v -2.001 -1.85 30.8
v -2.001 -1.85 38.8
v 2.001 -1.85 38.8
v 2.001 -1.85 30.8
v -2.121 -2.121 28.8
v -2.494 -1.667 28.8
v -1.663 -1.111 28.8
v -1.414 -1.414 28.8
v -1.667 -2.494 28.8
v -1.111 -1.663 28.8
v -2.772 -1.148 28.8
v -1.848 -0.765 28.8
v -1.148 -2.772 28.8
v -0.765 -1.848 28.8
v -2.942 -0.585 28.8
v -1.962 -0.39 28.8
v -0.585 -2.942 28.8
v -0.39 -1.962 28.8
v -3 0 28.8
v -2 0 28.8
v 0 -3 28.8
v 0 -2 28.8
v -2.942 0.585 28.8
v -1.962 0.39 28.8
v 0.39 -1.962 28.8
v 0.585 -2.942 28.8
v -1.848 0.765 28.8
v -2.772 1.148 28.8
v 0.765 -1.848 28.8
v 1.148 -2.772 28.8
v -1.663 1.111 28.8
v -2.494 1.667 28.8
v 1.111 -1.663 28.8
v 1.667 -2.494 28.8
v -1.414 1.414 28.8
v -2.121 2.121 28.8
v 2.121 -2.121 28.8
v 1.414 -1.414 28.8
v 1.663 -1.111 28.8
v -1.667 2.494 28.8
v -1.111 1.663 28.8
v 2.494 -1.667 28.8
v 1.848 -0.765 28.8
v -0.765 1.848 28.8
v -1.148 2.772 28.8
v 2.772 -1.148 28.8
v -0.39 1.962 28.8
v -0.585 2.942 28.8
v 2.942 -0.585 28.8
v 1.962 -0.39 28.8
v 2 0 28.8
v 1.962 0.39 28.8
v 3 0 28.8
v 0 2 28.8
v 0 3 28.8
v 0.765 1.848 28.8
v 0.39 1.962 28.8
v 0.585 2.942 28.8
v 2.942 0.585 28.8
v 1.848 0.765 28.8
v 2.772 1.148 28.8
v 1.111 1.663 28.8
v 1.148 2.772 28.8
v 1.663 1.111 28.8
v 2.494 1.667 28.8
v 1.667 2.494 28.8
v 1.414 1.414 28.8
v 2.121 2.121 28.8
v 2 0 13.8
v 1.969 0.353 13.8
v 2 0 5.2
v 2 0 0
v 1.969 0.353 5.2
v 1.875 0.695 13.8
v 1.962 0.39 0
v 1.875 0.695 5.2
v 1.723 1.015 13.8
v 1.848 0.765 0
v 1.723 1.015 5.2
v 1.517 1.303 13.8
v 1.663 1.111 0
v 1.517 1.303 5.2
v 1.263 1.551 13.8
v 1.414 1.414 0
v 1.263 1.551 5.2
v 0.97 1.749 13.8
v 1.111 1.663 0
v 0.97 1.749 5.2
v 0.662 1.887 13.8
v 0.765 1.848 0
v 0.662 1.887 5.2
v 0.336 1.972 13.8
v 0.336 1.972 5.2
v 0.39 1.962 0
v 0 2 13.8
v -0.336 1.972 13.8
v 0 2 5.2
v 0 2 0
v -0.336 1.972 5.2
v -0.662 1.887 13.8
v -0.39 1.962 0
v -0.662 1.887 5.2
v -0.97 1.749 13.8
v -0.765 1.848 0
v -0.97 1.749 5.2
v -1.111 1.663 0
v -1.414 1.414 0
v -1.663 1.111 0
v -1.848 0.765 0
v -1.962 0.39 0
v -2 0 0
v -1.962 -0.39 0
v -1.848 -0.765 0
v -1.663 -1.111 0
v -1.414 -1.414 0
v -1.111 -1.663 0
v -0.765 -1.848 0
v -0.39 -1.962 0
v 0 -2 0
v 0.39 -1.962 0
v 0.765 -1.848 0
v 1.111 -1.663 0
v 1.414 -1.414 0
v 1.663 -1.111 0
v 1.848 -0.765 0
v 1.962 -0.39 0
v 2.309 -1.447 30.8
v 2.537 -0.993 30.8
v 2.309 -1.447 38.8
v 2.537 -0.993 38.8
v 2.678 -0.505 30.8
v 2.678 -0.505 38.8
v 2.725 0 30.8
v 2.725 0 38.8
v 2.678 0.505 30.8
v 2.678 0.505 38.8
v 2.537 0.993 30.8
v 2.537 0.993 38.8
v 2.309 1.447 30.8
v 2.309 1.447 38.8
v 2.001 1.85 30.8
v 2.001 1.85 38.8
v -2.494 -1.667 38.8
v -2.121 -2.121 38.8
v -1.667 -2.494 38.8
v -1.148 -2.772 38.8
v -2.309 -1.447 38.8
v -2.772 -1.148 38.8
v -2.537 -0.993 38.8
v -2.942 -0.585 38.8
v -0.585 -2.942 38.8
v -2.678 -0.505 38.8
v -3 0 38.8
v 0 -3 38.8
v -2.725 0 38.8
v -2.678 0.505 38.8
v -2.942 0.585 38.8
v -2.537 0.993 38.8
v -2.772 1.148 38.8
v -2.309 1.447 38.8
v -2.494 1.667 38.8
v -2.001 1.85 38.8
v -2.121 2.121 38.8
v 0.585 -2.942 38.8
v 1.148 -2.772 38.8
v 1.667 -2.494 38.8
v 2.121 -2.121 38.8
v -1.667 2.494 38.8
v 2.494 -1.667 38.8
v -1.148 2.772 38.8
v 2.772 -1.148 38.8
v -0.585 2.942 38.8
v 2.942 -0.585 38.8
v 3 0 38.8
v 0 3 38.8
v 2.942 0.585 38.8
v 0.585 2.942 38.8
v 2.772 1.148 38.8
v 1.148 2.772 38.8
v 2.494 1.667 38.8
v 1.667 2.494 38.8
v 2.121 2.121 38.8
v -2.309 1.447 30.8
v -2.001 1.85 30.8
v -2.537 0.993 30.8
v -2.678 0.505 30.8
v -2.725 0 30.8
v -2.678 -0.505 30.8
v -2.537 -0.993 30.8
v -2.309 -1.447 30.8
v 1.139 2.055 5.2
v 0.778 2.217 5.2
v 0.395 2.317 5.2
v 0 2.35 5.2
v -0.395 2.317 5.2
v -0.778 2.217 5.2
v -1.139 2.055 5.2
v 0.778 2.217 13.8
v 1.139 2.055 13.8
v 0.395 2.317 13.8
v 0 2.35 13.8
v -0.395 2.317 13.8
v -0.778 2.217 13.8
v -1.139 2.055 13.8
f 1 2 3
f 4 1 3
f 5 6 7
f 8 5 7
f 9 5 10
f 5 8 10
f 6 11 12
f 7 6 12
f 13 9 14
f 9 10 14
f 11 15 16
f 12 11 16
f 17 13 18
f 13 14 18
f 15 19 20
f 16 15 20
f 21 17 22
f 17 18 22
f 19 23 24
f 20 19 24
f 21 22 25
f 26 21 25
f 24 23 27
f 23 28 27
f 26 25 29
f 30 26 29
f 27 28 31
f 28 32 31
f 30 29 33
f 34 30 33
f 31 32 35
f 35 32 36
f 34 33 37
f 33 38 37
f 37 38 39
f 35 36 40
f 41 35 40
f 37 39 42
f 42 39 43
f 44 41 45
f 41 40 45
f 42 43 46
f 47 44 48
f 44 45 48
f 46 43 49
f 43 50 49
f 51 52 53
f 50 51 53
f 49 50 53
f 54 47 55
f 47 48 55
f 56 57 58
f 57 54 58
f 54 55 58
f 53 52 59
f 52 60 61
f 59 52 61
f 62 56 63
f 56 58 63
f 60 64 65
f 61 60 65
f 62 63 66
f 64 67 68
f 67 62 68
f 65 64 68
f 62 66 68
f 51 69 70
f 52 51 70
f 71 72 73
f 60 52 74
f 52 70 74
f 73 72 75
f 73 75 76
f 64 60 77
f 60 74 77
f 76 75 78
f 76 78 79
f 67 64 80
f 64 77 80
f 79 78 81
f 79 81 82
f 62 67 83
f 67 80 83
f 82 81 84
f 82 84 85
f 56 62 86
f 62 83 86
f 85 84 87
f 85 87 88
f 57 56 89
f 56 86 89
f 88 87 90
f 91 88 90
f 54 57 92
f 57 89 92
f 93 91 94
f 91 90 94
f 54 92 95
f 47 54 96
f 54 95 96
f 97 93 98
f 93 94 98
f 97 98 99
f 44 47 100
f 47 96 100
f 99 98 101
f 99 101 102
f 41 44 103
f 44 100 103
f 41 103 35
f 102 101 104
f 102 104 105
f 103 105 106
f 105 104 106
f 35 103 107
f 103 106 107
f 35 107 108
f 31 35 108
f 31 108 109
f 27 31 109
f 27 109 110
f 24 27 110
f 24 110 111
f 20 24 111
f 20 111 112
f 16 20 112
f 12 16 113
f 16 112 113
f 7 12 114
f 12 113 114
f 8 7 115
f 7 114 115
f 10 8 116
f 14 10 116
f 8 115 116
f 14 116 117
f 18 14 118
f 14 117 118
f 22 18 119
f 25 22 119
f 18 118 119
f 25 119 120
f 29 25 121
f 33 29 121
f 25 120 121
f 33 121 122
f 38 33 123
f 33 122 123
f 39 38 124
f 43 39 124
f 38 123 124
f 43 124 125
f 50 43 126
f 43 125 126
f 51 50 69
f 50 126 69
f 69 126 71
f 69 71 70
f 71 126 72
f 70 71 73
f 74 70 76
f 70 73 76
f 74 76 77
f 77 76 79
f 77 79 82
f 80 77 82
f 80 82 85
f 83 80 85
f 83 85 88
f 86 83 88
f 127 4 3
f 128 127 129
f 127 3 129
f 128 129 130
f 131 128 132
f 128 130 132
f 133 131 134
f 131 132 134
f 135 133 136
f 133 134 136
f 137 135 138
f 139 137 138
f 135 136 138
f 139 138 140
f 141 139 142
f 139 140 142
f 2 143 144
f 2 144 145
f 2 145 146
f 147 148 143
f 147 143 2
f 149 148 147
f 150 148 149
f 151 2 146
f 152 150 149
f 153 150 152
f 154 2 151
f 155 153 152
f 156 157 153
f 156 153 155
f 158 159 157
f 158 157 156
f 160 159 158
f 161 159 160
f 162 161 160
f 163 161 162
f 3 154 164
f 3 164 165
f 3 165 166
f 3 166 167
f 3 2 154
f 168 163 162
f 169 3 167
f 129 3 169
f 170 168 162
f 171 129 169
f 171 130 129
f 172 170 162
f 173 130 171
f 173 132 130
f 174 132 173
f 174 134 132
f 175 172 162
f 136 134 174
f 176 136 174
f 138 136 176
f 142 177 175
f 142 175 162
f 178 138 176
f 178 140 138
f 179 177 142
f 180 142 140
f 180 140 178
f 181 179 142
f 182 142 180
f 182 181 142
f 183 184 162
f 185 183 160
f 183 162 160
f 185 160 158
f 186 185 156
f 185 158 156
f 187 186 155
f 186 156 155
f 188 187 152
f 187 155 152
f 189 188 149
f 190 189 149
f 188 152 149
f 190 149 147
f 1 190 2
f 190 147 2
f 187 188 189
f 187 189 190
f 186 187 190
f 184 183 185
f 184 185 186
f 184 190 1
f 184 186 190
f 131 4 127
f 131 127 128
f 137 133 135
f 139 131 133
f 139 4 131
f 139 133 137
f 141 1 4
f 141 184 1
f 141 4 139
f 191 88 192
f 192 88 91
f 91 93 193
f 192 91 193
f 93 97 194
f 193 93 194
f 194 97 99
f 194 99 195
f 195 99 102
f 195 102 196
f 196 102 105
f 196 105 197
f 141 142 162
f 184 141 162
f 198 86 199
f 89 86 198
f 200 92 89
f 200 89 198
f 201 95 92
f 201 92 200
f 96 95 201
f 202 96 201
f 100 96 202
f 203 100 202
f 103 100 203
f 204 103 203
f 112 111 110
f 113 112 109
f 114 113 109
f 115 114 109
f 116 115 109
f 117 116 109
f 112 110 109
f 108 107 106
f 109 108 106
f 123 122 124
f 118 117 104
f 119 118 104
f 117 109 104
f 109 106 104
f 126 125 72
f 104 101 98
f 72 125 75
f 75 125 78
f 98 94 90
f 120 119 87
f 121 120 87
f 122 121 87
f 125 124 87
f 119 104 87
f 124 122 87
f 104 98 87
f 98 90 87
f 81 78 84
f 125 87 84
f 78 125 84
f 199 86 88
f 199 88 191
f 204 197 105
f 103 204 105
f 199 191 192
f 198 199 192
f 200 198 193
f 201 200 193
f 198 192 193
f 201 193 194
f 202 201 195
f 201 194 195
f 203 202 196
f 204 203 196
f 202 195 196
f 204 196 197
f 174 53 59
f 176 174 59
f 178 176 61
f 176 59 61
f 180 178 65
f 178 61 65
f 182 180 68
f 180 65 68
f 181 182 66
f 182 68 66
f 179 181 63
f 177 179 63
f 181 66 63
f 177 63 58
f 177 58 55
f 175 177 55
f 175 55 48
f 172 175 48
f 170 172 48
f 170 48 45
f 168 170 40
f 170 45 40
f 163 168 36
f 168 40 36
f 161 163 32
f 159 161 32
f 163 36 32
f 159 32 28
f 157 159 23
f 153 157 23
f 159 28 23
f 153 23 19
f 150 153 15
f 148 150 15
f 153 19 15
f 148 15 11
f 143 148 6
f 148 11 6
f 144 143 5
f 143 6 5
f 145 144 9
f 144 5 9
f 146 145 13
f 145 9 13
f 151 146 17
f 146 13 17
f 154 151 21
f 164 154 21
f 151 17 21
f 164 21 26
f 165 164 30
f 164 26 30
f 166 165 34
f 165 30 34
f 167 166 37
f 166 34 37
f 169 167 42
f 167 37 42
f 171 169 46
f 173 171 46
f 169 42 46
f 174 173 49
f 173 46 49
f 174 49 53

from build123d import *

# Parameters (mm, degrees)
SKETCH3_R           = 2
BOSS_EXTRUDE1_DEPTH = 5.2
SKETCH4_R           = 2
BOSS_EXTRUDE2_DEPTH = 8.6
SKETCH5_R           = 2
BOSS_EXTRUDE3_DEPTH = 15
SKETCH6_R           = 3
BOSS_EXTRUDE4_DEPTH = 10
CUT_EXTRUDE1_DEPTH  = 8


with BuildPart() as part:
    # Sketch3 → Boss-Extrude1 (new body)
    with BuildSketch(Plane.XY):
        Circle(SKETCH3_R)
    extrude(amount=BOSS_EXTRUDE1_DEPTH)

    # Sketch4 → Boss-Extrude2 (add)
    with BuildSketch(Plane.XY.offset(5.2)):
        with Locations(Location((0, 0, 0), (0, 0, 119))):
            Circle(SKETCH4_R)
        with BuildLine():
            Line((0, 0), (1.139302608, 2.055356312))
            ThreePointArc((1.139302608, 2.055356312), (0, 2.35), (-1.139302608, 2.055356312))
            Line((-1.139302608, 2.055356312), (0, 0))
        make_face()
        with BuildLine():
            Line((0.96961924, 1.749239414), (0, 0))
            Line((0, 0), (-0.96961924, 1.749239414))
            ThreePointArc((-0.96961924, 1.749239414), (-1.015076726, -1.723258321), (2, 0))
            ThreePointArc((2, 0), (1.723258321, 1.015076726), (0.96961924, 1.749239414))
        make_face()
    extrude(amount=BOSS_EXTRUDE2_DEPTH)

    # Sketch5 → Boss-Extrude3 (add)
    with BuildSketch(Plane.XY.offset(13.8)):
        Circle(SKETCH5_R)
    extrude(amount=BOSS_EXTRUDE3_DEPTH)

    # Sketch6 → Boss-Extrude4 (add)
    with BuildSketch(Plane.XY.offset(28.8)):
        Circle(SKETCH6_R)
    extrude(amount=BOSS_EXTRUDE4_DEPTH)

    # Sketch7 → Cut-Extrude1 (cut)
    with BuildSketch(Plane.XY.offset(38.8)):
        with BuildLine():
            Line((2.000781097, 1.85), (-2.000781097, 1.85))
            ThreePointArc((-2.000781097, 1.85), (-2.725, 0), (-2.000781097, -1.85))
            Line((-2.000781097, -1.85), (2.000781097, -1.85))
            ThreePointArc((2.000781097, -1.85), (2.725, 0), (2.000781097, 1.85))
        make_face()
    extrude(amount=-CUT_EXTRUDE1_DEPTH, mode=Mode.SUBTRACT)


solid = part.part
